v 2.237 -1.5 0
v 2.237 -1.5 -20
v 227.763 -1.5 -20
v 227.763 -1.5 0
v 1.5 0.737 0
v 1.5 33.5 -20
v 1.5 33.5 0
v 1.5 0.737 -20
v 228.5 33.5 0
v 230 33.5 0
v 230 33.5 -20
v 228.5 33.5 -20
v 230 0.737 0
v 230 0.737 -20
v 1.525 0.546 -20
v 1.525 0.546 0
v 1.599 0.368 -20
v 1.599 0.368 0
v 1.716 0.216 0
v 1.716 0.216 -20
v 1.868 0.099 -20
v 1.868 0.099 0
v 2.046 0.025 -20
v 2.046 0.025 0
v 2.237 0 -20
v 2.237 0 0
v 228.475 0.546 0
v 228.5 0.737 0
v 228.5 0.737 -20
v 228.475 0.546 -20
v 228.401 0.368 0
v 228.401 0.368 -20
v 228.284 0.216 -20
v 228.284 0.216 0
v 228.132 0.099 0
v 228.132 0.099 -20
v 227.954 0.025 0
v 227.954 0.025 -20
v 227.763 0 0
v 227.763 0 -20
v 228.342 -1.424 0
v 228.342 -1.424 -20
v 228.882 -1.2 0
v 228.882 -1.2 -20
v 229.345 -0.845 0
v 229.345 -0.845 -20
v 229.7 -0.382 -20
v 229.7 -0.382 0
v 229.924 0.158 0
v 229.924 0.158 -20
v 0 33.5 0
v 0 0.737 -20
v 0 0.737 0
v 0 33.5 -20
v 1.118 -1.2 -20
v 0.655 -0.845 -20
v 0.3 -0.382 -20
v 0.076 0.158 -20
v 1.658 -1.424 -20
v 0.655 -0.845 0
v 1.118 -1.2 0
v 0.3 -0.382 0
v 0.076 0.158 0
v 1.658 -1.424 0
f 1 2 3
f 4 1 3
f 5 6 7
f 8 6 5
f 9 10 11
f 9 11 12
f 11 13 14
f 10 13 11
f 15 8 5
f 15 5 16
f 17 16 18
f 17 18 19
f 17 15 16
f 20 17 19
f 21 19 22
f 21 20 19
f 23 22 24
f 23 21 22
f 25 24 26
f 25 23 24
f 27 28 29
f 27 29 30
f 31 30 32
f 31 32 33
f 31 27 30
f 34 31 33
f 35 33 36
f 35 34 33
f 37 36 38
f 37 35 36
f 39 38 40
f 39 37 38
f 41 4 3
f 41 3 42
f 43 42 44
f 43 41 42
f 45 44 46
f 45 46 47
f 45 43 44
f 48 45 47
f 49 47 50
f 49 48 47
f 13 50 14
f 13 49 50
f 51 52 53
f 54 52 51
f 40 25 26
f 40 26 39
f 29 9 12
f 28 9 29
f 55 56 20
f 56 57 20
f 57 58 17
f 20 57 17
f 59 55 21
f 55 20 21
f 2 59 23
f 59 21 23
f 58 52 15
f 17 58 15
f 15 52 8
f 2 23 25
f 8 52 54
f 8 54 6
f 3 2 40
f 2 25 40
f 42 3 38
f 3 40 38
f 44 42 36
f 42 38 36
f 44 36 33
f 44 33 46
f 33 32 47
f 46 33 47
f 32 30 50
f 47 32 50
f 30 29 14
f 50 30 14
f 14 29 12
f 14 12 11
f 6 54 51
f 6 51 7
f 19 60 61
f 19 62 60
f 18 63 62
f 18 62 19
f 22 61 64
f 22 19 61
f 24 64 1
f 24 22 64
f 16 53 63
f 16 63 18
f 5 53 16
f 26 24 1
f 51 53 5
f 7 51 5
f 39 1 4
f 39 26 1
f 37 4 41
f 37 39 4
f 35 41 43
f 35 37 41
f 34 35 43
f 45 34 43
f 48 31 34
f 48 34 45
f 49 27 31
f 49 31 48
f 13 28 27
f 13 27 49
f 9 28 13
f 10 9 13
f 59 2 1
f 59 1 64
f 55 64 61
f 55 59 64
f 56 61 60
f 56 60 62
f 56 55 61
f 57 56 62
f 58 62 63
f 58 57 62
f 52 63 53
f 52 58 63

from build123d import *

# Parameters (mm, degrees)
SKETCH_1_W                       = 230
SKETCH_1_H                       = 20
SM_BASE_FLANGE_1_DEPTH           = 1.5
SM_EDGE_FLANGE_1_STRIP_W         = 7.4732
SM_EDGE_FLANGE_1_STRIP_H         = 1.5
SM_EDGE_FLANGE_1_STRIP_CUT_DEPTH = 20
SM_EDGE_FLANGE_1_DEPTH           = 20
SM_EDGE_FLANGE_2_STRIP_W         = 7.4732
SM_EDGE_FLANGE_2_STRIP_H         = 1.5
SM_EDGE_FLANGE_2_STRIP_CUT_DEPTH = 20
SM_EDGE_FLANGE_2_DEPTH           = 20


# Sheet-metal steps are written as plain solids
with BuildPart() as part:
    # Sketch 1 → Базовая кромка1 (new body)
    with BuildSketch(Plane(origin=(0, 0, 0), x_dir=(1, 0, 0), z_dir=(0, 1, 0))):
        with Locations((115, 10)):
            Rectangle(SKETCH_1_W, SKETCH_1_H)
    extrude(amount=-SM_BASE_FLANGE_1_DEPTH)

    # Ребро-кромка1 strip (across the edge) → Ребро-кромка1 strip cut (cut)
    with BuildSketch(Plane.XY.offset(-20)):
        with Locations((-1.5, -0.75)):
            Rectangle(SM_EDGE_FLANGE_1_STRIP_W, SM_EDGE_FLANGE_1_STRIP_H)
    extrude(amount=SM_EDGE_FLANGE_1_STRIP_CUT_DEPTH, mode=Mode.SUBTRACT)

    # Ребро-кромка1 section (across the edge) → Ребро-кромка1 (add)
    with BuildSketch(Plane.XY.offset(-20)):
        with BuildLine():
            Line((0, 0.7366), (0, 33.5))
            Line((0, 33.5), (1.5, 33.5))
            Line((1.5, 33.5), (1.5, 0.7366))
            ThreePointArc((1.5, 0.7366), (1.715745145, 0.215745145), (2.2366, 0))
            Line((2.2366, 0), (2.2366, -1.5))
            ThreePointArc((2.2366, -1.5), (0.655084973, -0.844915027), (0, 0.7366))
        make_face()
    extrude(amount=SM_EDGE_FLANGE_1_DEPTH)

    # Ребро-кромка2 strip (across the edge) → Ребро-кромка2 strip cut (cut)
    with BuildSketch(Plane(origin=(230, 0, 0), x_dir=(-1, 0, 0), z_dir=(0, 0, -1))):
        with Locations((-1.5, -0.75)):
            Rectangle(SM_EDGE_FLANGE_2_STRIP_W, SM_EDGE_FLANGE_2_STRIP_H)
    extrude(amount=SM_EDGE_FLANGE_2_STRIP_CUT_DEPTH, mode=Mode.SUBTRACT)

    # Ребро-кромка2 section (across the edge) → Ребро-кромка2 (add)
    with BuildSketch(Plane(origin=(230, 0, 0), x_dir=(-1, 0, 0), z_dir=(0, 0, -1))):
        with BuildLine():
            Line((0, 0.7366), (0, 33.5))
            Line((0, 33.5), (1.5, 33.5))
            Line((1.5, 33.5), (1.5, 0.7366))
            ThreePointArc((1.5, 0.7366), (1.715745145, 0.215745145), (2.2366, 0))
            Line((2.2366, 0), (2.2366, -1.5))
            ThreePointArc((2.2366, -1.5), (0.655084973, -0.844915027), (0, 0.7366))
        make_face()
    extrude(amount=SM_EDGE_FLANGE_2_DEPTH)


solid = part.part
